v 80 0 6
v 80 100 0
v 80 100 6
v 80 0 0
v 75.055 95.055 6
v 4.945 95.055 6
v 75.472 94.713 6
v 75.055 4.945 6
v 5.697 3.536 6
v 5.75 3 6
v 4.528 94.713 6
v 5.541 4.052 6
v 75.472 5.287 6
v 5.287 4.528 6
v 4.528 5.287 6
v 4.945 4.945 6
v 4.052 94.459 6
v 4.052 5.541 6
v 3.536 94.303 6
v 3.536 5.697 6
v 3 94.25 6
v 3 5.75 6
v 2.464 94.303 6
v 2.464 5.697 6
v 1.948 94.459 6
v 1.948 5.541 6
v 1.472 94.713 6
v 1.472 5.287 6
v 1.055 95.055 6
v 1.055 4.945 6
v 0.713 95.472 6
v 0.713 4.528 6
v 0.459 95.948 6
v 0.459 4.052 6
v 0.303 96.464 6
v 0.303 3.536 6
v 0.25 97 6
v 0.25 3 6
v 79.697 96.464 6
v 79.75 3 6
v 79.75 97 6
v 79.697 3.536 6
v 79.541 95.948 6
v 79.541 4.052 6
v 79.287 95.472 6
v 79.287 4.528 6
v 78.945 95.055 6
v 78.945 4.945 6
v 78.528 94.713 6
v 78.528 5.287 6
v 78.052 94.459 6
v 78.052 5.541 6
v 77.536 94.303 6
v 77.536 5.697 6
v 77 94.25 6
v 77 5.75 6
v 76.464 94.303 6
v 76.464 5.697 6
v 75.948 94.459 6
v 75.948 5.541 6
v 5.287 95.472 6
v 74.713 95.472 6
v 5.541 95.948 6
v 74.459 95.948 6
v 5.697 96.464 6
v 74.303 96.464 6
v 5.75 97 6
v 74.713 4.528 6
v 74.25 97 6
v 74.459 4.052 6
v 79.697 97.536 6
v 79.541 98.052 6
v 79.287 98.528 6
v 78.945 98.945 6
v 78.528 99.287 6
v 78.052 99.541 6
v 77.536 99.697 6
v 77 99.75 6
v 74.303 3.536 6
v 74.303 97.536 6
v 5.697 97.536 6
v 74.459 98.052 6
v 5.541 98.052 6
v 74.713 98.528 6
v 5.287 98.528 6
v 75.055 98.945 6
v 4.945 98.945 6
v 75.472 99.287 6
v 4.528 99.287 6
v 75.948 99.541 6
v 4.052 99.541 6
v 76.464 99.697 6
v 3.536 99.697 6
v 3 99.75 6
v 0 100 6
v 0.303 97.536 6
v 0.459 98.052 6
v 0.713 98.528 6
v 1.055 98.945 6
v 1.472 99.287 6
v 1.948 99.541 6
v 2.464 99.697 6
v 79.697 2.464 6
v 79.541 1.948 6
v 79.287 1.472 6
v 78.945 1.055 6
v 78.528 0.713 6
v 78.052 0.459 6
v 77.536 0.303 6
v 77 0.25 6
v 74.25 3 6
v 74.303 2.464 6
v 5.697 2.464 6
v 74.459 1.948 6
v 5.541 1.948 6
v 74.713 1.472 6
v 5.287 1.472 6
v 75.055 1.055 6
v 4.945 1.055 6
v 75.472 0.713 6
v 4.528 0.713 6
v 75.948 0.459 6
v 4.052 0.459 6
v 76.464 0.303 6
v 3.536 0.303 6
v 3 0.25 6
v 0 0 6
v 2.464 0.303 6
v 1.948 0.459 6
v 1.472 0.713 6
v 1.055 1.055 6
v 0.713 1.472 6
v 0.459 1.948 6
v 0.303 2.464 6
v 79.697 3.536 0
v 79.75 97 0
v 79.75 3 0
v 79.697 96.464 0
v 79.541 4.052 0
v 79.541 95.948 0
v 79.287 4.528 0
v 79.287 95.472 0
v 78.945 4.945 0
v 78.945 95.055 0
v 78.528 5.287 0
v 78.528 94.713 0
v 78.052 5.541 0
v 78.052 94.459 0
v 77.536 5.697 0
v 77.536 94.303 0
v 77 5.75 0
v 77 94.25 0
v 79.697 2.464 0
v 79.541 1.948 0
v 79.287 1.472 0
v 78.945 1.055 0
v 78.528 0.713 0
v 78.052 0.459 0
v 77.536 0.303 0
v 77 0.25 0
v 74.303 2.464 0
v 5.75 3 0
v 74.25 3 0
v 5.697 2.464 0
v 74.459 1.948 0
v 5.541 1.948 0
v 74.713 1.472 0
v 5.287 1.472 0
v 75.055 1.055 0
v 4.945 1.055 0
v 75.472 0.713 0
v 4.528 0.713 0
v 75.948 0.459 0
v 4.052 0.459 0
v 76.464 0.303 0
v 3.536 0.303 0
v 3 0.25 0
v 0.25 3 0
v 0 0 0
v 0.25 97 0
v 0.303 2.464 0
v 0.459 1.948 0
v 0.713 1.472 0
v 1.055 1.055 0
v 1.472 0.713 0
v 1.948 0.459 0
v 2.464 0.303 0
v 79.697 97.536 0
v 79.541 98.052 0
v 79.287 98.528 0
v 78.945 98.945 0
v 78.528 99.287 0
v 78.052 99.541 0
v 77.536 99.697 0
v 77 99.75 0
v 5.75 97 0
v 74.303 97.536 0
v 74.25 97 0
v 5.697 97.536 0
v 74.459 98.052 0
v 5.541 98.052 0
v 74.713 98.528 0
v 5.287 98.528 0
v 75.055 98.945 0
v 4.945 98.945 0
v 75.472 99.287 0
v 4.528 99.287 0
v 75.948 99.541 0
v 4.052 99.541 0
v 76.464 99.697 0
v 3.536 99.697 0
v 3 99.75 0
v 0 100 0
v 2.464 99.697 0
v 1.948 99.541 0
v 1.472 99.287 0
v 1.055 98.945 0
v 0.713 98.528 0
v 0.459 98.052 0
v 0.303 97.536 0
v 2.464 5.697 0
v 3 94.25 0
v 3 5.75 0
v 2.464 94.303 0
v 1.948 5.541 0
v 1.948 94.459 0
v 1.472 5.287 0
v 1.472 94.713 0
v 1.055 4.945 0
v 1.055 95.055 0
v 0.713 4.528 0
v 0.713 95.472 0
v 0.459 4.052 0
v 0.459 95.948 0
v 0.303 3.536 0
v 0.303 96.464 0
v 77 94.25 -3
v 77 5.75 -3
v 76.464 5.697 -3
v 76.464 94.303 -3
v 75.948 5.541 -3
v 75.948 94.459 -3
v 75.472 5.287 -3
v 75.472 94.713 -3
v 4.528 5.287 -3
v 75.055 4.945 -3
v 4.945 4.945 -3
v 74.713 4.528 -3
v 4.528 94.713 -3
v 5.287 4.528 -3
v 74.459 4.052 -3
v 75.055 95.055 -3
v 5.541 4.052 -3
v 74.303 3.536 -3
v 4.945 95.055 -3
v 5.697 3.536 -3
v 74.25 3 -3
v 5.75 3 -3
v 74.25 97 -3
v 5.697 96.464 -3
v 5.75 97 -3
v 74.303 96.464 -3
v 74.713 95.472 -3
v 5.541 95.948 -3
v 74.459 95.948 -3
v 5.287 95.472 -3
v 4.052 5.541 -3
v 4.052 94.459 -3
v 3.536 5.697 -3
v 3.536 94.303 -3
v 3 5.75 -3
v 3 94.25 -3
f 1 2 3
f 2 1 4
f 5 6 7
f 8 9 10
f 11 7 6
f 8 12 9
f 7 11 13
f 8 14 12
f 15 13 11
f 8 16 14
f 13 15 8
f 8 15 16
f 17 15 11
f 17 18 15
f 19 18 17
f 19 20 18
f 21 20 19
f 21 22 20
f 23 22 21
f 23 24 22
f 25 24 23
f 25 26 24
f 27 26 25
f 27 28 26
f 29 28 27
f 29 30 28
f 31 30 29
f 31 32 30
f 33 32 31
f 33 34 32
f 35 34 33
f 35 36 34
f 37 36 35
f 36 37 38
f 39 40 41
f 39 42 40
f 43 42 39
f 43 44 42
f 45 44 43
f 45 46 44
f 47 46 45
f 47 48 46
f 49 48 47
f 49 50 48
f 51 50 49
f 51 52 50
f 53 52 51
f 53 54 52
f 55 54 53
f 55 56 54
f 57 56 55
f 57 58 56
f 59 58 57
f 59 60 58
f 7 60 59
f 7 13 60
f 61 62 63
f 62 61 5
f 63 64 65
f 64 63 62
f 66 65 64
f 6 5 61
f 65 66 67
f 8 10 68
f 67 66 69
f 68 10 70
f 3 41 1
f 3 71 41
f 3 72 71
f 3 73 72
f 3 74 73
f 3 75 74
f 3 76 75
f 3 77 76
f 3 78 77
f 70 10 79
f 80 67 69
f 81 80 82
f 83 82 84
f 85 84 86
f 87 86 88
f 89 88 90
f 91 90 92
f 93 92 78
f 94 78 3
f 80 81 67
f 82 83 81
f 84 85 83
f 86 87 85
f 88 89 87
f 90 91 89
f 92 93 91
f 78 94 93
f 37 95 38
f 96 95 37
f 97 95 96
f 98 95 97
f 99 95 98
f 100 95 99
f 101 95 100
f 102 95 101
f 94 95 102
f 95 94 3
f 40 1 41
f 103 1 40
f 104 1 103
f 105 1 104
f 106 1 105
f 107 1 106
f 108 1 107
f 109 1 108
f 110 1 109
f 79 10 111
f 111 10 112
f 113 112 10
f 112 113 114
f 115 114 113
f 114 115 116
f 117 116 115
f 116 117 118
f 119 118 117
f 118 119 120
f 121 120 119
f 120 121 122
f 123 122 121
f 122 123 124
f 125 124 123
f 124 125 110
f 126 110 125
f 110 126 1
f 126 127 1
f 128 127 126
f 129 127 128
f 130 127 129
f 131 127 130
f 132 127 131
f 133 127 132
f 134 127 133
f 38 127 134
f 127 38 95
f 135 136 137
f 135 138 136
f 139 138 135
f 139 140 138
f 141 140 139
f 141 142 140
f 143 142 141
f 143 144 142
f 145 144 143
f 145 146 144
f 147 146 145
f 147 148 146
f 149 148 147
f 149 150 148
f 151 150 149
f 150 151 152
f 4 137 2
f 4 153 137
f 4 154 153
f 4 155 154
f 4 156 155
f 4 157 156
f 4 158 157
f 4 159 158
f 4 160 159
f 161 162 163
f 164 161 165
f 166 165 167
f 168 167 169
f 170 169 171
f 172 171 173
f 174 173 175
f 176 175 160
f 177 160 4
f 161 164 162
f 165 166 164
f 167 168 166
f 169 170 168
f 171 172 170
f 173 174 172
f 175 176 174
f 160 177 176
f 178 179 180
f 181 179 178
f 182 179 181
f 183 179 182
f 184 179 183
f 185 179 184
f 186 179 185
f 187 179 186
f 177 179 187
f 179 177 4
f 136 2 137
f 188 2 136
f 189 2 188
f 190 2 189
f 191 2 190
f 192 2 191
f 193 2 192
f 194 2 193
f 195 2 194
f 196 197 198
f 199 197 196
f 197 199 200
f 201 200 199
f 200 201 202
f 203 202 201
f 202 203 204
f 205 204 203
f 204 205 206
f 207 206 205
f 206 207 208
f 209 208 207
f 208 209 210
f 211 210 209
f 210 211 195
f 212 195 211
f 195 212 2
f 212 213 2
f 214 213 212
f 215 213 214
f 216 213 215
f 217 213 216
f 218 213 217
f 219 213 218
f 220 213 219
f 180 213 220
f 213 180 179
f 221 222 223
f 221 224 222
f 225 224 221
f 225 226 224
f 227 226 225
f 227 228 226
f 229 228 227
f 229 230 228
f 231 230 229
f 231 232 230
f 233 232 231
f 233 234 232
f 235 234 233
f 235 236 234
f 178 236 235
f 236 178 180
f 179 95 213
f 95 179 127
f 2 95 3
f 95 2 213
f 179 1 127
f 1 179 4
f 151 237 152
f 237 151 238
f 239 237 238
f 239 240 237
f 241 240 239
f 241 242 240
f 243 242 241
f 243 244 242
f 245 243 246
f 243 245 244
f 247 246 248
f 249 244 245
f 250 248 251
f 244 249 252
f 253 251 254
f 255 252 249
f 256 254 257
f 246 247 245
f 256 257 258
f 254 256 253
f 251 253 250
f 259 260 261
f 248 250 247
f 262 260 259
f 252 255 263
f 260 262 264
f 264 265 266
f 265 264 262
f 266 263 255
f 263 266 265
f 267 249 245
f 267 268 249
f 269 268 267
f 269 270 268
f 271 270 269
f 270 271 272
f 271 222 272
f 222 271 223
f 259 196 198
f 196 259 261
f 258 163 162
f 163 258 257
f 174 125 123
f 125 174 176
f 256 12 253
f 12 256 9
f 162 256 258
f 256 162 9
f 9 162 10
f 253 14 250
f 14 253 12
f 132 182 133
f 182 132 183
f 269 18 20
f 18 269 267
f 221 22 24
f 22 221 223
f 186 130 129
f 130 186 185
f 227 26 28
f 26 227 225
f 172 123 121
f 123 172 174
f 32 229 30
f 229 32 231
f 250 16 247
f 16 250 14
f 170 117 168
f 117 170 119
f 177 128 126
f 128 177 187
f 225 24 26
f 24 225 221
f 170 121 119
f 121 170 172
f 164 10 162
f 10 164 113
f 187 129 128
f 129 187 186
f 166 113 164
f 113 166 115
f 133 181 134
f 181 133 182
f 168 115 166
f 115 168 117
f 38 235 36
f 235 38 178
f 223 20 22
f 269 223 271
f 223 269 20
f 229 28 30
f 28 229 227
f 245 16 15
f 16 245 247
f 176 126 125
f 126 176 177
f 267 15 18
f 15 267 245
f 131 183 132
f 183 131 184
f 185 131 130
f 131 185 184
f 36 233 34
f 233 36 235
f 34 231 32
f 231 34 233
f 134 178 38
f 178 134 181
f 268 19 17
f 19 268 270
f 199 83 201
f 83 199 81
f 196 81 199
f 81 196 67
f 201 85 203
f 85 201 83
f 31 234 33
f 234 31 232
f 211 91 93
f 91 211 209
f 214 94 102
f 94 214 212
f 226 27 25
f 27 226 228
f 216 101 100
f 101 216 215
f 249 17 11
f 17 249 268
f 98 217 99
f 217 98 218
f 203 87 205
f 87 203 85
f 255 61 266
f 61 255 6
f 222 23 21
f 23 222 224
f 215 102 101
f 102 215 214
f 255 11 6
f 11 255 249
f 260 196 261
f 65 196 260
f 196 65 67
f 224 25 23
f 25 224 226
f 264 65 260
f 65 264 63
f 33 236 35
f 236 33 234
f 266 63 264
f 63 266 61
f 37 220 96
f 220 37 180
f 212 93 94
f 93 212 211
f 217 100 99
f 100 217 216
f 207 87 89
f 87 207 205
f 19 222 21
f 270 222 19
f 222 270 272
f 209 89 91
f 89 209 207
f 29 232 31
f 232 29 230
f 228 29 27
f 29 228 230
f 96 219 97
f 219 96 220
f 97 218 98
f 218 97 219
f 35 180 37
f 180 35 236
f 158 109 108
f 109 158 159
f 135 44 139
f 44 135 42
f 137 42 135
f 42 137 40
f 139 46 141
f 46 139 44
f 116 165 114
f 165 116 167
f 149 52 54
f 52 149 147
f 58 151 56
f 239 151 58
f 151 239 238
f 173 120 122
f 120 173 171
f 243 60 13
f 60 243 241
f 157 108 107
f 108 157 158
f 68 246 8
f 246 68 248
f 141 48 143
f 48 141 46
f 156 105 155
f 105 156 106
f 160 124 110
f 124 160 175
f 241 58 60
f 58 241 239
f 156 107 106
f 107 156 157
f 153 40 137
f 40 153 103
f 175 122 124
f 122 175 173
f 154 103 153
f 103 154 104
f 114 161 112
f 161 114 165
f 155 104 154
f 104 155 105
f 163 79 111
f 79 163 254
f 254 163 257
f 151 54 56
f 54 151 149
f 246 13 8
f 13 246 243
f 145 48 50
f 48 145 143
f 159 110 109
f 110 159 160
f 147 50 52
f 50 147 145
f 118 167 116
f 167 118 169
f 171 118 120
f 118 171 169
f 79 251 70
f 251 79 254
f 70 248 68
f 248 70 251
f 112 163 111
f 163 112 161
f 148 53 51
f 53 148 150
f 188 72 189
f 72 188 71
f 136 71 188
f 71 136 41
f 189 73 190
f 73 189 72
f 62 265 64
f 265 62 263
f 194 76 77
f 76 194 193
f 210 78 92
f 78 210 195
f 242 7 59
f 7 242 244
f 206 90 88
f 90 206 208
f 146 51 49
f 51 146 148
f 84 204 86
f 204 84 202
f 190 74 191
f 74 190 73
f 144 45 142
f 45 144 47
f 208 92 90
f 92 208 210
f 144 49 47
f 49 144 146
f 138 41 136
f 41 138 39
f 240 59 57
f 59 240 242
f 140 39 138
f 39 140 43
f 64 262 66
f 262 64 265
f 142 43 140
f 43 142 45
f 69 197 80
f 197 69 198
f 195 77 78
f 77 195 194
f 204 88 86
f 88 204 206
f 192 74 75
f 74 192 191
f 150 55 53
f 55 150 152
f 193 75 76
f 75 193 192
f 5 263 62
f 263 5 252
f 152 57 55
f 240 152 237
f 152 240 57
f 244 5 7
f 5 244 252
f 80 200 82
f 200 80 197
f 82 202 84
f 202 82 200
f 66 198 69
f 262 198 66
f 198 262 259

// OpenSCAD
$fn = 32;

// ----------------------------------------------------------------------
// Enclosure lid: 80 x 100 x 6 mm, 4 bolt holes
// ----------------------------------------------------------------------

// --- parameters (mm) ---
length = 80;              // lid length, X
width = 100;              // lid width, Y
plate_t = 6;              // lid plate thickness
bolt_d = 5.5;             // bolt clearance
boss_lip = 3;             // bolt hole inset from the corner
sink = 1;                 // overlap of the lip and ribs into the plate
lip_h = 4;                // lip height below the plate
lip_wall = 3;             // lip wall thickness

module plate() {
  cube([length, width, plate_t]);
  /* lip that drops into the housing opening, sunk into the plate */
  translate([lip_wall, lip_wall, -lip_h + sink]) cube([length - 2 * lip_wall, width - 2 * lip_wall, lip_h]);
}

difference() {
  plate();
  /* bolt pattern matching the corner bosses */
  for (sx = [0, 1]) for (sy = [0, 1])
    translate([sx * (length - 2 * boss_lip) + boss_lip, sy * (width - 2 * boss_lip) + boss_lip, -lip_h - 1])
      cylinder(h = plate_t + lip_h + 2, d = bolt_d);
}
